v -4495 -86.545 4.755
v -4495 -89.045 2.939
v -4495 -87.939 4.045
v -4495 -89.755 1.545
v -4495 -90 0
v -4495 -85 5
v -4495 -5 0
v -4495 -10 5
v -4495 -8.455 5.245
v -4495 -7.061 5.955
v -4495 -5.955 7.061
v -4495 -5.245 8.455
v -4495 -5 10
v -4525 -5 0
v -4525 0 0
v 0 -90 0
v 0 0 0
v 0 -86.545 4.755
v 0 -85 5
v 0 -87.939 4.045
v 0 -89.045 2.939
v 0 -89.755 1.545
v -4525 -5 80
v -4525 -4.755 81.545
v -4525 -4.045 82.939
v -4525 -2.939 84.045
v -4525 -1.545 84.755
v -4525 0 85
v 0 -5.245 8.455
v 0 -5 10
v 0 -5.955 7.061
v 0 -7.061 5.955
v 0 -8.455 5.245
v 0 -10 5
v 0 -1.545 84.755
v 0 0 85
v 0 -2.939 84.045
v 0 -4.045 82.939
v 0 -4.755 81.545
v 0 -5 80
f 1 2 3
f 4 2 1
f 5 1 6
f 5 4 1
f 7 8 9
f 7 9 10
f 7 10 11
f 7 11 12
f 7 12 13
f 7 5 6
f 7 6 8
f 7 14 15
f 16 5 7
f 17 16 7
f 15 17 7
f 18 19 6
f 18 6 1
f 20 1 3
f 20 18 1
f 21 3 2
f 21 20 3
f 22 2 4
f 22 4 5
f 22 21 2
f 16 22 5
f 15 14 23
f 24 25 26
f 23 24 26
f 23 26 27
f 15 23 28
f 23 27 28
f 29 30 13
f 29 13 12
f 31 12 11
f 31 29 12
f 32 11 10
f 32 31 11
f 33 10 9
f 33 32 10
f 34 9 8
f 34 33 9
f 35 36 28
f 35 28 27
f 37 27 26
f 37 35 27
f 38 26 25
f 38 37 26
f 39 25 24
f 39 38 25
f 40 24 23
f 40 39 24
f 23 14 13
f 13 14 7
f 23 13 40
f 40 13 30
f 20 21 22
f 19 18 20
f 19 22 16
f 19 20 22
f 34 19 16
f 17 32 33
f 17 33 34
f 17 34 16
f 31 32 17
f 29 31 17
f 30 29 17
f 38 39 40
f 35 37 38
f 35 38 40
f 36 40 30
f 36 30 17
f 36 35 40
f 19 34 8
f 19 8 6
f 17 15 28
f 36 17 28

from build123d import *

# Parameters (mm, degrees)
ANGLE_IRON_35_X_35_X_5_2_DEPTH = 4525
CUT_EXTRUDE2_DEPTH             = 4527.60192639
CUT_EXTRUDE2_DEPTH_BACK        = 4527.60192639
SKETCH15_W                     = 30
SKETCH15_H                     = 85


with BuildPart() as part:
    # Sketch13 → Angle iron 35 X 35 X 5(2) (new body)
    with BuildSketch(Plane(origin=(0, 0, 0), x_dir=(0, -1, 0), z_dir=(-1, 0, 0))):
        with BuildLine():
            Line((0, 0), (0, 85))
            ThreePointArc((0, 85), (3.535533906, 83.535533906), (5, 80))
            Line((5, 80), (5, 10))
            ThreePointArc((5, 10), (6.464466094, 6.464466094), (10, 5))
            Line((10, 5), (85, 5))
            ThreePointArc((85, 5), (88.535533906, 3.535533906), (90, 0))
            Line((90, 0), (0, 0))
        make_face()
    extrude(amount=ANGLE_IRON_35_X_35_X_5_2_DEPTH)

    # Sketch15 → Cut-Extrude2 (cut, two sides: drawn at the far end of the back side and taken through both)
    with BuildSketch(Plane.XY.offset(5).offset(-CUT_EXTRUDE2_DEPTH_BACK)):
        with Locations((-4510, -47.5)):
            Rectangle(SKETCH15_W, SKETCH15_H)
    extrude(amount=CUT_EXTRUDE2_DEPTH + CUT_EXTRUDE2_DEPTH_BACK, mode=Mode.SUBTRACT)


solid = part.part
